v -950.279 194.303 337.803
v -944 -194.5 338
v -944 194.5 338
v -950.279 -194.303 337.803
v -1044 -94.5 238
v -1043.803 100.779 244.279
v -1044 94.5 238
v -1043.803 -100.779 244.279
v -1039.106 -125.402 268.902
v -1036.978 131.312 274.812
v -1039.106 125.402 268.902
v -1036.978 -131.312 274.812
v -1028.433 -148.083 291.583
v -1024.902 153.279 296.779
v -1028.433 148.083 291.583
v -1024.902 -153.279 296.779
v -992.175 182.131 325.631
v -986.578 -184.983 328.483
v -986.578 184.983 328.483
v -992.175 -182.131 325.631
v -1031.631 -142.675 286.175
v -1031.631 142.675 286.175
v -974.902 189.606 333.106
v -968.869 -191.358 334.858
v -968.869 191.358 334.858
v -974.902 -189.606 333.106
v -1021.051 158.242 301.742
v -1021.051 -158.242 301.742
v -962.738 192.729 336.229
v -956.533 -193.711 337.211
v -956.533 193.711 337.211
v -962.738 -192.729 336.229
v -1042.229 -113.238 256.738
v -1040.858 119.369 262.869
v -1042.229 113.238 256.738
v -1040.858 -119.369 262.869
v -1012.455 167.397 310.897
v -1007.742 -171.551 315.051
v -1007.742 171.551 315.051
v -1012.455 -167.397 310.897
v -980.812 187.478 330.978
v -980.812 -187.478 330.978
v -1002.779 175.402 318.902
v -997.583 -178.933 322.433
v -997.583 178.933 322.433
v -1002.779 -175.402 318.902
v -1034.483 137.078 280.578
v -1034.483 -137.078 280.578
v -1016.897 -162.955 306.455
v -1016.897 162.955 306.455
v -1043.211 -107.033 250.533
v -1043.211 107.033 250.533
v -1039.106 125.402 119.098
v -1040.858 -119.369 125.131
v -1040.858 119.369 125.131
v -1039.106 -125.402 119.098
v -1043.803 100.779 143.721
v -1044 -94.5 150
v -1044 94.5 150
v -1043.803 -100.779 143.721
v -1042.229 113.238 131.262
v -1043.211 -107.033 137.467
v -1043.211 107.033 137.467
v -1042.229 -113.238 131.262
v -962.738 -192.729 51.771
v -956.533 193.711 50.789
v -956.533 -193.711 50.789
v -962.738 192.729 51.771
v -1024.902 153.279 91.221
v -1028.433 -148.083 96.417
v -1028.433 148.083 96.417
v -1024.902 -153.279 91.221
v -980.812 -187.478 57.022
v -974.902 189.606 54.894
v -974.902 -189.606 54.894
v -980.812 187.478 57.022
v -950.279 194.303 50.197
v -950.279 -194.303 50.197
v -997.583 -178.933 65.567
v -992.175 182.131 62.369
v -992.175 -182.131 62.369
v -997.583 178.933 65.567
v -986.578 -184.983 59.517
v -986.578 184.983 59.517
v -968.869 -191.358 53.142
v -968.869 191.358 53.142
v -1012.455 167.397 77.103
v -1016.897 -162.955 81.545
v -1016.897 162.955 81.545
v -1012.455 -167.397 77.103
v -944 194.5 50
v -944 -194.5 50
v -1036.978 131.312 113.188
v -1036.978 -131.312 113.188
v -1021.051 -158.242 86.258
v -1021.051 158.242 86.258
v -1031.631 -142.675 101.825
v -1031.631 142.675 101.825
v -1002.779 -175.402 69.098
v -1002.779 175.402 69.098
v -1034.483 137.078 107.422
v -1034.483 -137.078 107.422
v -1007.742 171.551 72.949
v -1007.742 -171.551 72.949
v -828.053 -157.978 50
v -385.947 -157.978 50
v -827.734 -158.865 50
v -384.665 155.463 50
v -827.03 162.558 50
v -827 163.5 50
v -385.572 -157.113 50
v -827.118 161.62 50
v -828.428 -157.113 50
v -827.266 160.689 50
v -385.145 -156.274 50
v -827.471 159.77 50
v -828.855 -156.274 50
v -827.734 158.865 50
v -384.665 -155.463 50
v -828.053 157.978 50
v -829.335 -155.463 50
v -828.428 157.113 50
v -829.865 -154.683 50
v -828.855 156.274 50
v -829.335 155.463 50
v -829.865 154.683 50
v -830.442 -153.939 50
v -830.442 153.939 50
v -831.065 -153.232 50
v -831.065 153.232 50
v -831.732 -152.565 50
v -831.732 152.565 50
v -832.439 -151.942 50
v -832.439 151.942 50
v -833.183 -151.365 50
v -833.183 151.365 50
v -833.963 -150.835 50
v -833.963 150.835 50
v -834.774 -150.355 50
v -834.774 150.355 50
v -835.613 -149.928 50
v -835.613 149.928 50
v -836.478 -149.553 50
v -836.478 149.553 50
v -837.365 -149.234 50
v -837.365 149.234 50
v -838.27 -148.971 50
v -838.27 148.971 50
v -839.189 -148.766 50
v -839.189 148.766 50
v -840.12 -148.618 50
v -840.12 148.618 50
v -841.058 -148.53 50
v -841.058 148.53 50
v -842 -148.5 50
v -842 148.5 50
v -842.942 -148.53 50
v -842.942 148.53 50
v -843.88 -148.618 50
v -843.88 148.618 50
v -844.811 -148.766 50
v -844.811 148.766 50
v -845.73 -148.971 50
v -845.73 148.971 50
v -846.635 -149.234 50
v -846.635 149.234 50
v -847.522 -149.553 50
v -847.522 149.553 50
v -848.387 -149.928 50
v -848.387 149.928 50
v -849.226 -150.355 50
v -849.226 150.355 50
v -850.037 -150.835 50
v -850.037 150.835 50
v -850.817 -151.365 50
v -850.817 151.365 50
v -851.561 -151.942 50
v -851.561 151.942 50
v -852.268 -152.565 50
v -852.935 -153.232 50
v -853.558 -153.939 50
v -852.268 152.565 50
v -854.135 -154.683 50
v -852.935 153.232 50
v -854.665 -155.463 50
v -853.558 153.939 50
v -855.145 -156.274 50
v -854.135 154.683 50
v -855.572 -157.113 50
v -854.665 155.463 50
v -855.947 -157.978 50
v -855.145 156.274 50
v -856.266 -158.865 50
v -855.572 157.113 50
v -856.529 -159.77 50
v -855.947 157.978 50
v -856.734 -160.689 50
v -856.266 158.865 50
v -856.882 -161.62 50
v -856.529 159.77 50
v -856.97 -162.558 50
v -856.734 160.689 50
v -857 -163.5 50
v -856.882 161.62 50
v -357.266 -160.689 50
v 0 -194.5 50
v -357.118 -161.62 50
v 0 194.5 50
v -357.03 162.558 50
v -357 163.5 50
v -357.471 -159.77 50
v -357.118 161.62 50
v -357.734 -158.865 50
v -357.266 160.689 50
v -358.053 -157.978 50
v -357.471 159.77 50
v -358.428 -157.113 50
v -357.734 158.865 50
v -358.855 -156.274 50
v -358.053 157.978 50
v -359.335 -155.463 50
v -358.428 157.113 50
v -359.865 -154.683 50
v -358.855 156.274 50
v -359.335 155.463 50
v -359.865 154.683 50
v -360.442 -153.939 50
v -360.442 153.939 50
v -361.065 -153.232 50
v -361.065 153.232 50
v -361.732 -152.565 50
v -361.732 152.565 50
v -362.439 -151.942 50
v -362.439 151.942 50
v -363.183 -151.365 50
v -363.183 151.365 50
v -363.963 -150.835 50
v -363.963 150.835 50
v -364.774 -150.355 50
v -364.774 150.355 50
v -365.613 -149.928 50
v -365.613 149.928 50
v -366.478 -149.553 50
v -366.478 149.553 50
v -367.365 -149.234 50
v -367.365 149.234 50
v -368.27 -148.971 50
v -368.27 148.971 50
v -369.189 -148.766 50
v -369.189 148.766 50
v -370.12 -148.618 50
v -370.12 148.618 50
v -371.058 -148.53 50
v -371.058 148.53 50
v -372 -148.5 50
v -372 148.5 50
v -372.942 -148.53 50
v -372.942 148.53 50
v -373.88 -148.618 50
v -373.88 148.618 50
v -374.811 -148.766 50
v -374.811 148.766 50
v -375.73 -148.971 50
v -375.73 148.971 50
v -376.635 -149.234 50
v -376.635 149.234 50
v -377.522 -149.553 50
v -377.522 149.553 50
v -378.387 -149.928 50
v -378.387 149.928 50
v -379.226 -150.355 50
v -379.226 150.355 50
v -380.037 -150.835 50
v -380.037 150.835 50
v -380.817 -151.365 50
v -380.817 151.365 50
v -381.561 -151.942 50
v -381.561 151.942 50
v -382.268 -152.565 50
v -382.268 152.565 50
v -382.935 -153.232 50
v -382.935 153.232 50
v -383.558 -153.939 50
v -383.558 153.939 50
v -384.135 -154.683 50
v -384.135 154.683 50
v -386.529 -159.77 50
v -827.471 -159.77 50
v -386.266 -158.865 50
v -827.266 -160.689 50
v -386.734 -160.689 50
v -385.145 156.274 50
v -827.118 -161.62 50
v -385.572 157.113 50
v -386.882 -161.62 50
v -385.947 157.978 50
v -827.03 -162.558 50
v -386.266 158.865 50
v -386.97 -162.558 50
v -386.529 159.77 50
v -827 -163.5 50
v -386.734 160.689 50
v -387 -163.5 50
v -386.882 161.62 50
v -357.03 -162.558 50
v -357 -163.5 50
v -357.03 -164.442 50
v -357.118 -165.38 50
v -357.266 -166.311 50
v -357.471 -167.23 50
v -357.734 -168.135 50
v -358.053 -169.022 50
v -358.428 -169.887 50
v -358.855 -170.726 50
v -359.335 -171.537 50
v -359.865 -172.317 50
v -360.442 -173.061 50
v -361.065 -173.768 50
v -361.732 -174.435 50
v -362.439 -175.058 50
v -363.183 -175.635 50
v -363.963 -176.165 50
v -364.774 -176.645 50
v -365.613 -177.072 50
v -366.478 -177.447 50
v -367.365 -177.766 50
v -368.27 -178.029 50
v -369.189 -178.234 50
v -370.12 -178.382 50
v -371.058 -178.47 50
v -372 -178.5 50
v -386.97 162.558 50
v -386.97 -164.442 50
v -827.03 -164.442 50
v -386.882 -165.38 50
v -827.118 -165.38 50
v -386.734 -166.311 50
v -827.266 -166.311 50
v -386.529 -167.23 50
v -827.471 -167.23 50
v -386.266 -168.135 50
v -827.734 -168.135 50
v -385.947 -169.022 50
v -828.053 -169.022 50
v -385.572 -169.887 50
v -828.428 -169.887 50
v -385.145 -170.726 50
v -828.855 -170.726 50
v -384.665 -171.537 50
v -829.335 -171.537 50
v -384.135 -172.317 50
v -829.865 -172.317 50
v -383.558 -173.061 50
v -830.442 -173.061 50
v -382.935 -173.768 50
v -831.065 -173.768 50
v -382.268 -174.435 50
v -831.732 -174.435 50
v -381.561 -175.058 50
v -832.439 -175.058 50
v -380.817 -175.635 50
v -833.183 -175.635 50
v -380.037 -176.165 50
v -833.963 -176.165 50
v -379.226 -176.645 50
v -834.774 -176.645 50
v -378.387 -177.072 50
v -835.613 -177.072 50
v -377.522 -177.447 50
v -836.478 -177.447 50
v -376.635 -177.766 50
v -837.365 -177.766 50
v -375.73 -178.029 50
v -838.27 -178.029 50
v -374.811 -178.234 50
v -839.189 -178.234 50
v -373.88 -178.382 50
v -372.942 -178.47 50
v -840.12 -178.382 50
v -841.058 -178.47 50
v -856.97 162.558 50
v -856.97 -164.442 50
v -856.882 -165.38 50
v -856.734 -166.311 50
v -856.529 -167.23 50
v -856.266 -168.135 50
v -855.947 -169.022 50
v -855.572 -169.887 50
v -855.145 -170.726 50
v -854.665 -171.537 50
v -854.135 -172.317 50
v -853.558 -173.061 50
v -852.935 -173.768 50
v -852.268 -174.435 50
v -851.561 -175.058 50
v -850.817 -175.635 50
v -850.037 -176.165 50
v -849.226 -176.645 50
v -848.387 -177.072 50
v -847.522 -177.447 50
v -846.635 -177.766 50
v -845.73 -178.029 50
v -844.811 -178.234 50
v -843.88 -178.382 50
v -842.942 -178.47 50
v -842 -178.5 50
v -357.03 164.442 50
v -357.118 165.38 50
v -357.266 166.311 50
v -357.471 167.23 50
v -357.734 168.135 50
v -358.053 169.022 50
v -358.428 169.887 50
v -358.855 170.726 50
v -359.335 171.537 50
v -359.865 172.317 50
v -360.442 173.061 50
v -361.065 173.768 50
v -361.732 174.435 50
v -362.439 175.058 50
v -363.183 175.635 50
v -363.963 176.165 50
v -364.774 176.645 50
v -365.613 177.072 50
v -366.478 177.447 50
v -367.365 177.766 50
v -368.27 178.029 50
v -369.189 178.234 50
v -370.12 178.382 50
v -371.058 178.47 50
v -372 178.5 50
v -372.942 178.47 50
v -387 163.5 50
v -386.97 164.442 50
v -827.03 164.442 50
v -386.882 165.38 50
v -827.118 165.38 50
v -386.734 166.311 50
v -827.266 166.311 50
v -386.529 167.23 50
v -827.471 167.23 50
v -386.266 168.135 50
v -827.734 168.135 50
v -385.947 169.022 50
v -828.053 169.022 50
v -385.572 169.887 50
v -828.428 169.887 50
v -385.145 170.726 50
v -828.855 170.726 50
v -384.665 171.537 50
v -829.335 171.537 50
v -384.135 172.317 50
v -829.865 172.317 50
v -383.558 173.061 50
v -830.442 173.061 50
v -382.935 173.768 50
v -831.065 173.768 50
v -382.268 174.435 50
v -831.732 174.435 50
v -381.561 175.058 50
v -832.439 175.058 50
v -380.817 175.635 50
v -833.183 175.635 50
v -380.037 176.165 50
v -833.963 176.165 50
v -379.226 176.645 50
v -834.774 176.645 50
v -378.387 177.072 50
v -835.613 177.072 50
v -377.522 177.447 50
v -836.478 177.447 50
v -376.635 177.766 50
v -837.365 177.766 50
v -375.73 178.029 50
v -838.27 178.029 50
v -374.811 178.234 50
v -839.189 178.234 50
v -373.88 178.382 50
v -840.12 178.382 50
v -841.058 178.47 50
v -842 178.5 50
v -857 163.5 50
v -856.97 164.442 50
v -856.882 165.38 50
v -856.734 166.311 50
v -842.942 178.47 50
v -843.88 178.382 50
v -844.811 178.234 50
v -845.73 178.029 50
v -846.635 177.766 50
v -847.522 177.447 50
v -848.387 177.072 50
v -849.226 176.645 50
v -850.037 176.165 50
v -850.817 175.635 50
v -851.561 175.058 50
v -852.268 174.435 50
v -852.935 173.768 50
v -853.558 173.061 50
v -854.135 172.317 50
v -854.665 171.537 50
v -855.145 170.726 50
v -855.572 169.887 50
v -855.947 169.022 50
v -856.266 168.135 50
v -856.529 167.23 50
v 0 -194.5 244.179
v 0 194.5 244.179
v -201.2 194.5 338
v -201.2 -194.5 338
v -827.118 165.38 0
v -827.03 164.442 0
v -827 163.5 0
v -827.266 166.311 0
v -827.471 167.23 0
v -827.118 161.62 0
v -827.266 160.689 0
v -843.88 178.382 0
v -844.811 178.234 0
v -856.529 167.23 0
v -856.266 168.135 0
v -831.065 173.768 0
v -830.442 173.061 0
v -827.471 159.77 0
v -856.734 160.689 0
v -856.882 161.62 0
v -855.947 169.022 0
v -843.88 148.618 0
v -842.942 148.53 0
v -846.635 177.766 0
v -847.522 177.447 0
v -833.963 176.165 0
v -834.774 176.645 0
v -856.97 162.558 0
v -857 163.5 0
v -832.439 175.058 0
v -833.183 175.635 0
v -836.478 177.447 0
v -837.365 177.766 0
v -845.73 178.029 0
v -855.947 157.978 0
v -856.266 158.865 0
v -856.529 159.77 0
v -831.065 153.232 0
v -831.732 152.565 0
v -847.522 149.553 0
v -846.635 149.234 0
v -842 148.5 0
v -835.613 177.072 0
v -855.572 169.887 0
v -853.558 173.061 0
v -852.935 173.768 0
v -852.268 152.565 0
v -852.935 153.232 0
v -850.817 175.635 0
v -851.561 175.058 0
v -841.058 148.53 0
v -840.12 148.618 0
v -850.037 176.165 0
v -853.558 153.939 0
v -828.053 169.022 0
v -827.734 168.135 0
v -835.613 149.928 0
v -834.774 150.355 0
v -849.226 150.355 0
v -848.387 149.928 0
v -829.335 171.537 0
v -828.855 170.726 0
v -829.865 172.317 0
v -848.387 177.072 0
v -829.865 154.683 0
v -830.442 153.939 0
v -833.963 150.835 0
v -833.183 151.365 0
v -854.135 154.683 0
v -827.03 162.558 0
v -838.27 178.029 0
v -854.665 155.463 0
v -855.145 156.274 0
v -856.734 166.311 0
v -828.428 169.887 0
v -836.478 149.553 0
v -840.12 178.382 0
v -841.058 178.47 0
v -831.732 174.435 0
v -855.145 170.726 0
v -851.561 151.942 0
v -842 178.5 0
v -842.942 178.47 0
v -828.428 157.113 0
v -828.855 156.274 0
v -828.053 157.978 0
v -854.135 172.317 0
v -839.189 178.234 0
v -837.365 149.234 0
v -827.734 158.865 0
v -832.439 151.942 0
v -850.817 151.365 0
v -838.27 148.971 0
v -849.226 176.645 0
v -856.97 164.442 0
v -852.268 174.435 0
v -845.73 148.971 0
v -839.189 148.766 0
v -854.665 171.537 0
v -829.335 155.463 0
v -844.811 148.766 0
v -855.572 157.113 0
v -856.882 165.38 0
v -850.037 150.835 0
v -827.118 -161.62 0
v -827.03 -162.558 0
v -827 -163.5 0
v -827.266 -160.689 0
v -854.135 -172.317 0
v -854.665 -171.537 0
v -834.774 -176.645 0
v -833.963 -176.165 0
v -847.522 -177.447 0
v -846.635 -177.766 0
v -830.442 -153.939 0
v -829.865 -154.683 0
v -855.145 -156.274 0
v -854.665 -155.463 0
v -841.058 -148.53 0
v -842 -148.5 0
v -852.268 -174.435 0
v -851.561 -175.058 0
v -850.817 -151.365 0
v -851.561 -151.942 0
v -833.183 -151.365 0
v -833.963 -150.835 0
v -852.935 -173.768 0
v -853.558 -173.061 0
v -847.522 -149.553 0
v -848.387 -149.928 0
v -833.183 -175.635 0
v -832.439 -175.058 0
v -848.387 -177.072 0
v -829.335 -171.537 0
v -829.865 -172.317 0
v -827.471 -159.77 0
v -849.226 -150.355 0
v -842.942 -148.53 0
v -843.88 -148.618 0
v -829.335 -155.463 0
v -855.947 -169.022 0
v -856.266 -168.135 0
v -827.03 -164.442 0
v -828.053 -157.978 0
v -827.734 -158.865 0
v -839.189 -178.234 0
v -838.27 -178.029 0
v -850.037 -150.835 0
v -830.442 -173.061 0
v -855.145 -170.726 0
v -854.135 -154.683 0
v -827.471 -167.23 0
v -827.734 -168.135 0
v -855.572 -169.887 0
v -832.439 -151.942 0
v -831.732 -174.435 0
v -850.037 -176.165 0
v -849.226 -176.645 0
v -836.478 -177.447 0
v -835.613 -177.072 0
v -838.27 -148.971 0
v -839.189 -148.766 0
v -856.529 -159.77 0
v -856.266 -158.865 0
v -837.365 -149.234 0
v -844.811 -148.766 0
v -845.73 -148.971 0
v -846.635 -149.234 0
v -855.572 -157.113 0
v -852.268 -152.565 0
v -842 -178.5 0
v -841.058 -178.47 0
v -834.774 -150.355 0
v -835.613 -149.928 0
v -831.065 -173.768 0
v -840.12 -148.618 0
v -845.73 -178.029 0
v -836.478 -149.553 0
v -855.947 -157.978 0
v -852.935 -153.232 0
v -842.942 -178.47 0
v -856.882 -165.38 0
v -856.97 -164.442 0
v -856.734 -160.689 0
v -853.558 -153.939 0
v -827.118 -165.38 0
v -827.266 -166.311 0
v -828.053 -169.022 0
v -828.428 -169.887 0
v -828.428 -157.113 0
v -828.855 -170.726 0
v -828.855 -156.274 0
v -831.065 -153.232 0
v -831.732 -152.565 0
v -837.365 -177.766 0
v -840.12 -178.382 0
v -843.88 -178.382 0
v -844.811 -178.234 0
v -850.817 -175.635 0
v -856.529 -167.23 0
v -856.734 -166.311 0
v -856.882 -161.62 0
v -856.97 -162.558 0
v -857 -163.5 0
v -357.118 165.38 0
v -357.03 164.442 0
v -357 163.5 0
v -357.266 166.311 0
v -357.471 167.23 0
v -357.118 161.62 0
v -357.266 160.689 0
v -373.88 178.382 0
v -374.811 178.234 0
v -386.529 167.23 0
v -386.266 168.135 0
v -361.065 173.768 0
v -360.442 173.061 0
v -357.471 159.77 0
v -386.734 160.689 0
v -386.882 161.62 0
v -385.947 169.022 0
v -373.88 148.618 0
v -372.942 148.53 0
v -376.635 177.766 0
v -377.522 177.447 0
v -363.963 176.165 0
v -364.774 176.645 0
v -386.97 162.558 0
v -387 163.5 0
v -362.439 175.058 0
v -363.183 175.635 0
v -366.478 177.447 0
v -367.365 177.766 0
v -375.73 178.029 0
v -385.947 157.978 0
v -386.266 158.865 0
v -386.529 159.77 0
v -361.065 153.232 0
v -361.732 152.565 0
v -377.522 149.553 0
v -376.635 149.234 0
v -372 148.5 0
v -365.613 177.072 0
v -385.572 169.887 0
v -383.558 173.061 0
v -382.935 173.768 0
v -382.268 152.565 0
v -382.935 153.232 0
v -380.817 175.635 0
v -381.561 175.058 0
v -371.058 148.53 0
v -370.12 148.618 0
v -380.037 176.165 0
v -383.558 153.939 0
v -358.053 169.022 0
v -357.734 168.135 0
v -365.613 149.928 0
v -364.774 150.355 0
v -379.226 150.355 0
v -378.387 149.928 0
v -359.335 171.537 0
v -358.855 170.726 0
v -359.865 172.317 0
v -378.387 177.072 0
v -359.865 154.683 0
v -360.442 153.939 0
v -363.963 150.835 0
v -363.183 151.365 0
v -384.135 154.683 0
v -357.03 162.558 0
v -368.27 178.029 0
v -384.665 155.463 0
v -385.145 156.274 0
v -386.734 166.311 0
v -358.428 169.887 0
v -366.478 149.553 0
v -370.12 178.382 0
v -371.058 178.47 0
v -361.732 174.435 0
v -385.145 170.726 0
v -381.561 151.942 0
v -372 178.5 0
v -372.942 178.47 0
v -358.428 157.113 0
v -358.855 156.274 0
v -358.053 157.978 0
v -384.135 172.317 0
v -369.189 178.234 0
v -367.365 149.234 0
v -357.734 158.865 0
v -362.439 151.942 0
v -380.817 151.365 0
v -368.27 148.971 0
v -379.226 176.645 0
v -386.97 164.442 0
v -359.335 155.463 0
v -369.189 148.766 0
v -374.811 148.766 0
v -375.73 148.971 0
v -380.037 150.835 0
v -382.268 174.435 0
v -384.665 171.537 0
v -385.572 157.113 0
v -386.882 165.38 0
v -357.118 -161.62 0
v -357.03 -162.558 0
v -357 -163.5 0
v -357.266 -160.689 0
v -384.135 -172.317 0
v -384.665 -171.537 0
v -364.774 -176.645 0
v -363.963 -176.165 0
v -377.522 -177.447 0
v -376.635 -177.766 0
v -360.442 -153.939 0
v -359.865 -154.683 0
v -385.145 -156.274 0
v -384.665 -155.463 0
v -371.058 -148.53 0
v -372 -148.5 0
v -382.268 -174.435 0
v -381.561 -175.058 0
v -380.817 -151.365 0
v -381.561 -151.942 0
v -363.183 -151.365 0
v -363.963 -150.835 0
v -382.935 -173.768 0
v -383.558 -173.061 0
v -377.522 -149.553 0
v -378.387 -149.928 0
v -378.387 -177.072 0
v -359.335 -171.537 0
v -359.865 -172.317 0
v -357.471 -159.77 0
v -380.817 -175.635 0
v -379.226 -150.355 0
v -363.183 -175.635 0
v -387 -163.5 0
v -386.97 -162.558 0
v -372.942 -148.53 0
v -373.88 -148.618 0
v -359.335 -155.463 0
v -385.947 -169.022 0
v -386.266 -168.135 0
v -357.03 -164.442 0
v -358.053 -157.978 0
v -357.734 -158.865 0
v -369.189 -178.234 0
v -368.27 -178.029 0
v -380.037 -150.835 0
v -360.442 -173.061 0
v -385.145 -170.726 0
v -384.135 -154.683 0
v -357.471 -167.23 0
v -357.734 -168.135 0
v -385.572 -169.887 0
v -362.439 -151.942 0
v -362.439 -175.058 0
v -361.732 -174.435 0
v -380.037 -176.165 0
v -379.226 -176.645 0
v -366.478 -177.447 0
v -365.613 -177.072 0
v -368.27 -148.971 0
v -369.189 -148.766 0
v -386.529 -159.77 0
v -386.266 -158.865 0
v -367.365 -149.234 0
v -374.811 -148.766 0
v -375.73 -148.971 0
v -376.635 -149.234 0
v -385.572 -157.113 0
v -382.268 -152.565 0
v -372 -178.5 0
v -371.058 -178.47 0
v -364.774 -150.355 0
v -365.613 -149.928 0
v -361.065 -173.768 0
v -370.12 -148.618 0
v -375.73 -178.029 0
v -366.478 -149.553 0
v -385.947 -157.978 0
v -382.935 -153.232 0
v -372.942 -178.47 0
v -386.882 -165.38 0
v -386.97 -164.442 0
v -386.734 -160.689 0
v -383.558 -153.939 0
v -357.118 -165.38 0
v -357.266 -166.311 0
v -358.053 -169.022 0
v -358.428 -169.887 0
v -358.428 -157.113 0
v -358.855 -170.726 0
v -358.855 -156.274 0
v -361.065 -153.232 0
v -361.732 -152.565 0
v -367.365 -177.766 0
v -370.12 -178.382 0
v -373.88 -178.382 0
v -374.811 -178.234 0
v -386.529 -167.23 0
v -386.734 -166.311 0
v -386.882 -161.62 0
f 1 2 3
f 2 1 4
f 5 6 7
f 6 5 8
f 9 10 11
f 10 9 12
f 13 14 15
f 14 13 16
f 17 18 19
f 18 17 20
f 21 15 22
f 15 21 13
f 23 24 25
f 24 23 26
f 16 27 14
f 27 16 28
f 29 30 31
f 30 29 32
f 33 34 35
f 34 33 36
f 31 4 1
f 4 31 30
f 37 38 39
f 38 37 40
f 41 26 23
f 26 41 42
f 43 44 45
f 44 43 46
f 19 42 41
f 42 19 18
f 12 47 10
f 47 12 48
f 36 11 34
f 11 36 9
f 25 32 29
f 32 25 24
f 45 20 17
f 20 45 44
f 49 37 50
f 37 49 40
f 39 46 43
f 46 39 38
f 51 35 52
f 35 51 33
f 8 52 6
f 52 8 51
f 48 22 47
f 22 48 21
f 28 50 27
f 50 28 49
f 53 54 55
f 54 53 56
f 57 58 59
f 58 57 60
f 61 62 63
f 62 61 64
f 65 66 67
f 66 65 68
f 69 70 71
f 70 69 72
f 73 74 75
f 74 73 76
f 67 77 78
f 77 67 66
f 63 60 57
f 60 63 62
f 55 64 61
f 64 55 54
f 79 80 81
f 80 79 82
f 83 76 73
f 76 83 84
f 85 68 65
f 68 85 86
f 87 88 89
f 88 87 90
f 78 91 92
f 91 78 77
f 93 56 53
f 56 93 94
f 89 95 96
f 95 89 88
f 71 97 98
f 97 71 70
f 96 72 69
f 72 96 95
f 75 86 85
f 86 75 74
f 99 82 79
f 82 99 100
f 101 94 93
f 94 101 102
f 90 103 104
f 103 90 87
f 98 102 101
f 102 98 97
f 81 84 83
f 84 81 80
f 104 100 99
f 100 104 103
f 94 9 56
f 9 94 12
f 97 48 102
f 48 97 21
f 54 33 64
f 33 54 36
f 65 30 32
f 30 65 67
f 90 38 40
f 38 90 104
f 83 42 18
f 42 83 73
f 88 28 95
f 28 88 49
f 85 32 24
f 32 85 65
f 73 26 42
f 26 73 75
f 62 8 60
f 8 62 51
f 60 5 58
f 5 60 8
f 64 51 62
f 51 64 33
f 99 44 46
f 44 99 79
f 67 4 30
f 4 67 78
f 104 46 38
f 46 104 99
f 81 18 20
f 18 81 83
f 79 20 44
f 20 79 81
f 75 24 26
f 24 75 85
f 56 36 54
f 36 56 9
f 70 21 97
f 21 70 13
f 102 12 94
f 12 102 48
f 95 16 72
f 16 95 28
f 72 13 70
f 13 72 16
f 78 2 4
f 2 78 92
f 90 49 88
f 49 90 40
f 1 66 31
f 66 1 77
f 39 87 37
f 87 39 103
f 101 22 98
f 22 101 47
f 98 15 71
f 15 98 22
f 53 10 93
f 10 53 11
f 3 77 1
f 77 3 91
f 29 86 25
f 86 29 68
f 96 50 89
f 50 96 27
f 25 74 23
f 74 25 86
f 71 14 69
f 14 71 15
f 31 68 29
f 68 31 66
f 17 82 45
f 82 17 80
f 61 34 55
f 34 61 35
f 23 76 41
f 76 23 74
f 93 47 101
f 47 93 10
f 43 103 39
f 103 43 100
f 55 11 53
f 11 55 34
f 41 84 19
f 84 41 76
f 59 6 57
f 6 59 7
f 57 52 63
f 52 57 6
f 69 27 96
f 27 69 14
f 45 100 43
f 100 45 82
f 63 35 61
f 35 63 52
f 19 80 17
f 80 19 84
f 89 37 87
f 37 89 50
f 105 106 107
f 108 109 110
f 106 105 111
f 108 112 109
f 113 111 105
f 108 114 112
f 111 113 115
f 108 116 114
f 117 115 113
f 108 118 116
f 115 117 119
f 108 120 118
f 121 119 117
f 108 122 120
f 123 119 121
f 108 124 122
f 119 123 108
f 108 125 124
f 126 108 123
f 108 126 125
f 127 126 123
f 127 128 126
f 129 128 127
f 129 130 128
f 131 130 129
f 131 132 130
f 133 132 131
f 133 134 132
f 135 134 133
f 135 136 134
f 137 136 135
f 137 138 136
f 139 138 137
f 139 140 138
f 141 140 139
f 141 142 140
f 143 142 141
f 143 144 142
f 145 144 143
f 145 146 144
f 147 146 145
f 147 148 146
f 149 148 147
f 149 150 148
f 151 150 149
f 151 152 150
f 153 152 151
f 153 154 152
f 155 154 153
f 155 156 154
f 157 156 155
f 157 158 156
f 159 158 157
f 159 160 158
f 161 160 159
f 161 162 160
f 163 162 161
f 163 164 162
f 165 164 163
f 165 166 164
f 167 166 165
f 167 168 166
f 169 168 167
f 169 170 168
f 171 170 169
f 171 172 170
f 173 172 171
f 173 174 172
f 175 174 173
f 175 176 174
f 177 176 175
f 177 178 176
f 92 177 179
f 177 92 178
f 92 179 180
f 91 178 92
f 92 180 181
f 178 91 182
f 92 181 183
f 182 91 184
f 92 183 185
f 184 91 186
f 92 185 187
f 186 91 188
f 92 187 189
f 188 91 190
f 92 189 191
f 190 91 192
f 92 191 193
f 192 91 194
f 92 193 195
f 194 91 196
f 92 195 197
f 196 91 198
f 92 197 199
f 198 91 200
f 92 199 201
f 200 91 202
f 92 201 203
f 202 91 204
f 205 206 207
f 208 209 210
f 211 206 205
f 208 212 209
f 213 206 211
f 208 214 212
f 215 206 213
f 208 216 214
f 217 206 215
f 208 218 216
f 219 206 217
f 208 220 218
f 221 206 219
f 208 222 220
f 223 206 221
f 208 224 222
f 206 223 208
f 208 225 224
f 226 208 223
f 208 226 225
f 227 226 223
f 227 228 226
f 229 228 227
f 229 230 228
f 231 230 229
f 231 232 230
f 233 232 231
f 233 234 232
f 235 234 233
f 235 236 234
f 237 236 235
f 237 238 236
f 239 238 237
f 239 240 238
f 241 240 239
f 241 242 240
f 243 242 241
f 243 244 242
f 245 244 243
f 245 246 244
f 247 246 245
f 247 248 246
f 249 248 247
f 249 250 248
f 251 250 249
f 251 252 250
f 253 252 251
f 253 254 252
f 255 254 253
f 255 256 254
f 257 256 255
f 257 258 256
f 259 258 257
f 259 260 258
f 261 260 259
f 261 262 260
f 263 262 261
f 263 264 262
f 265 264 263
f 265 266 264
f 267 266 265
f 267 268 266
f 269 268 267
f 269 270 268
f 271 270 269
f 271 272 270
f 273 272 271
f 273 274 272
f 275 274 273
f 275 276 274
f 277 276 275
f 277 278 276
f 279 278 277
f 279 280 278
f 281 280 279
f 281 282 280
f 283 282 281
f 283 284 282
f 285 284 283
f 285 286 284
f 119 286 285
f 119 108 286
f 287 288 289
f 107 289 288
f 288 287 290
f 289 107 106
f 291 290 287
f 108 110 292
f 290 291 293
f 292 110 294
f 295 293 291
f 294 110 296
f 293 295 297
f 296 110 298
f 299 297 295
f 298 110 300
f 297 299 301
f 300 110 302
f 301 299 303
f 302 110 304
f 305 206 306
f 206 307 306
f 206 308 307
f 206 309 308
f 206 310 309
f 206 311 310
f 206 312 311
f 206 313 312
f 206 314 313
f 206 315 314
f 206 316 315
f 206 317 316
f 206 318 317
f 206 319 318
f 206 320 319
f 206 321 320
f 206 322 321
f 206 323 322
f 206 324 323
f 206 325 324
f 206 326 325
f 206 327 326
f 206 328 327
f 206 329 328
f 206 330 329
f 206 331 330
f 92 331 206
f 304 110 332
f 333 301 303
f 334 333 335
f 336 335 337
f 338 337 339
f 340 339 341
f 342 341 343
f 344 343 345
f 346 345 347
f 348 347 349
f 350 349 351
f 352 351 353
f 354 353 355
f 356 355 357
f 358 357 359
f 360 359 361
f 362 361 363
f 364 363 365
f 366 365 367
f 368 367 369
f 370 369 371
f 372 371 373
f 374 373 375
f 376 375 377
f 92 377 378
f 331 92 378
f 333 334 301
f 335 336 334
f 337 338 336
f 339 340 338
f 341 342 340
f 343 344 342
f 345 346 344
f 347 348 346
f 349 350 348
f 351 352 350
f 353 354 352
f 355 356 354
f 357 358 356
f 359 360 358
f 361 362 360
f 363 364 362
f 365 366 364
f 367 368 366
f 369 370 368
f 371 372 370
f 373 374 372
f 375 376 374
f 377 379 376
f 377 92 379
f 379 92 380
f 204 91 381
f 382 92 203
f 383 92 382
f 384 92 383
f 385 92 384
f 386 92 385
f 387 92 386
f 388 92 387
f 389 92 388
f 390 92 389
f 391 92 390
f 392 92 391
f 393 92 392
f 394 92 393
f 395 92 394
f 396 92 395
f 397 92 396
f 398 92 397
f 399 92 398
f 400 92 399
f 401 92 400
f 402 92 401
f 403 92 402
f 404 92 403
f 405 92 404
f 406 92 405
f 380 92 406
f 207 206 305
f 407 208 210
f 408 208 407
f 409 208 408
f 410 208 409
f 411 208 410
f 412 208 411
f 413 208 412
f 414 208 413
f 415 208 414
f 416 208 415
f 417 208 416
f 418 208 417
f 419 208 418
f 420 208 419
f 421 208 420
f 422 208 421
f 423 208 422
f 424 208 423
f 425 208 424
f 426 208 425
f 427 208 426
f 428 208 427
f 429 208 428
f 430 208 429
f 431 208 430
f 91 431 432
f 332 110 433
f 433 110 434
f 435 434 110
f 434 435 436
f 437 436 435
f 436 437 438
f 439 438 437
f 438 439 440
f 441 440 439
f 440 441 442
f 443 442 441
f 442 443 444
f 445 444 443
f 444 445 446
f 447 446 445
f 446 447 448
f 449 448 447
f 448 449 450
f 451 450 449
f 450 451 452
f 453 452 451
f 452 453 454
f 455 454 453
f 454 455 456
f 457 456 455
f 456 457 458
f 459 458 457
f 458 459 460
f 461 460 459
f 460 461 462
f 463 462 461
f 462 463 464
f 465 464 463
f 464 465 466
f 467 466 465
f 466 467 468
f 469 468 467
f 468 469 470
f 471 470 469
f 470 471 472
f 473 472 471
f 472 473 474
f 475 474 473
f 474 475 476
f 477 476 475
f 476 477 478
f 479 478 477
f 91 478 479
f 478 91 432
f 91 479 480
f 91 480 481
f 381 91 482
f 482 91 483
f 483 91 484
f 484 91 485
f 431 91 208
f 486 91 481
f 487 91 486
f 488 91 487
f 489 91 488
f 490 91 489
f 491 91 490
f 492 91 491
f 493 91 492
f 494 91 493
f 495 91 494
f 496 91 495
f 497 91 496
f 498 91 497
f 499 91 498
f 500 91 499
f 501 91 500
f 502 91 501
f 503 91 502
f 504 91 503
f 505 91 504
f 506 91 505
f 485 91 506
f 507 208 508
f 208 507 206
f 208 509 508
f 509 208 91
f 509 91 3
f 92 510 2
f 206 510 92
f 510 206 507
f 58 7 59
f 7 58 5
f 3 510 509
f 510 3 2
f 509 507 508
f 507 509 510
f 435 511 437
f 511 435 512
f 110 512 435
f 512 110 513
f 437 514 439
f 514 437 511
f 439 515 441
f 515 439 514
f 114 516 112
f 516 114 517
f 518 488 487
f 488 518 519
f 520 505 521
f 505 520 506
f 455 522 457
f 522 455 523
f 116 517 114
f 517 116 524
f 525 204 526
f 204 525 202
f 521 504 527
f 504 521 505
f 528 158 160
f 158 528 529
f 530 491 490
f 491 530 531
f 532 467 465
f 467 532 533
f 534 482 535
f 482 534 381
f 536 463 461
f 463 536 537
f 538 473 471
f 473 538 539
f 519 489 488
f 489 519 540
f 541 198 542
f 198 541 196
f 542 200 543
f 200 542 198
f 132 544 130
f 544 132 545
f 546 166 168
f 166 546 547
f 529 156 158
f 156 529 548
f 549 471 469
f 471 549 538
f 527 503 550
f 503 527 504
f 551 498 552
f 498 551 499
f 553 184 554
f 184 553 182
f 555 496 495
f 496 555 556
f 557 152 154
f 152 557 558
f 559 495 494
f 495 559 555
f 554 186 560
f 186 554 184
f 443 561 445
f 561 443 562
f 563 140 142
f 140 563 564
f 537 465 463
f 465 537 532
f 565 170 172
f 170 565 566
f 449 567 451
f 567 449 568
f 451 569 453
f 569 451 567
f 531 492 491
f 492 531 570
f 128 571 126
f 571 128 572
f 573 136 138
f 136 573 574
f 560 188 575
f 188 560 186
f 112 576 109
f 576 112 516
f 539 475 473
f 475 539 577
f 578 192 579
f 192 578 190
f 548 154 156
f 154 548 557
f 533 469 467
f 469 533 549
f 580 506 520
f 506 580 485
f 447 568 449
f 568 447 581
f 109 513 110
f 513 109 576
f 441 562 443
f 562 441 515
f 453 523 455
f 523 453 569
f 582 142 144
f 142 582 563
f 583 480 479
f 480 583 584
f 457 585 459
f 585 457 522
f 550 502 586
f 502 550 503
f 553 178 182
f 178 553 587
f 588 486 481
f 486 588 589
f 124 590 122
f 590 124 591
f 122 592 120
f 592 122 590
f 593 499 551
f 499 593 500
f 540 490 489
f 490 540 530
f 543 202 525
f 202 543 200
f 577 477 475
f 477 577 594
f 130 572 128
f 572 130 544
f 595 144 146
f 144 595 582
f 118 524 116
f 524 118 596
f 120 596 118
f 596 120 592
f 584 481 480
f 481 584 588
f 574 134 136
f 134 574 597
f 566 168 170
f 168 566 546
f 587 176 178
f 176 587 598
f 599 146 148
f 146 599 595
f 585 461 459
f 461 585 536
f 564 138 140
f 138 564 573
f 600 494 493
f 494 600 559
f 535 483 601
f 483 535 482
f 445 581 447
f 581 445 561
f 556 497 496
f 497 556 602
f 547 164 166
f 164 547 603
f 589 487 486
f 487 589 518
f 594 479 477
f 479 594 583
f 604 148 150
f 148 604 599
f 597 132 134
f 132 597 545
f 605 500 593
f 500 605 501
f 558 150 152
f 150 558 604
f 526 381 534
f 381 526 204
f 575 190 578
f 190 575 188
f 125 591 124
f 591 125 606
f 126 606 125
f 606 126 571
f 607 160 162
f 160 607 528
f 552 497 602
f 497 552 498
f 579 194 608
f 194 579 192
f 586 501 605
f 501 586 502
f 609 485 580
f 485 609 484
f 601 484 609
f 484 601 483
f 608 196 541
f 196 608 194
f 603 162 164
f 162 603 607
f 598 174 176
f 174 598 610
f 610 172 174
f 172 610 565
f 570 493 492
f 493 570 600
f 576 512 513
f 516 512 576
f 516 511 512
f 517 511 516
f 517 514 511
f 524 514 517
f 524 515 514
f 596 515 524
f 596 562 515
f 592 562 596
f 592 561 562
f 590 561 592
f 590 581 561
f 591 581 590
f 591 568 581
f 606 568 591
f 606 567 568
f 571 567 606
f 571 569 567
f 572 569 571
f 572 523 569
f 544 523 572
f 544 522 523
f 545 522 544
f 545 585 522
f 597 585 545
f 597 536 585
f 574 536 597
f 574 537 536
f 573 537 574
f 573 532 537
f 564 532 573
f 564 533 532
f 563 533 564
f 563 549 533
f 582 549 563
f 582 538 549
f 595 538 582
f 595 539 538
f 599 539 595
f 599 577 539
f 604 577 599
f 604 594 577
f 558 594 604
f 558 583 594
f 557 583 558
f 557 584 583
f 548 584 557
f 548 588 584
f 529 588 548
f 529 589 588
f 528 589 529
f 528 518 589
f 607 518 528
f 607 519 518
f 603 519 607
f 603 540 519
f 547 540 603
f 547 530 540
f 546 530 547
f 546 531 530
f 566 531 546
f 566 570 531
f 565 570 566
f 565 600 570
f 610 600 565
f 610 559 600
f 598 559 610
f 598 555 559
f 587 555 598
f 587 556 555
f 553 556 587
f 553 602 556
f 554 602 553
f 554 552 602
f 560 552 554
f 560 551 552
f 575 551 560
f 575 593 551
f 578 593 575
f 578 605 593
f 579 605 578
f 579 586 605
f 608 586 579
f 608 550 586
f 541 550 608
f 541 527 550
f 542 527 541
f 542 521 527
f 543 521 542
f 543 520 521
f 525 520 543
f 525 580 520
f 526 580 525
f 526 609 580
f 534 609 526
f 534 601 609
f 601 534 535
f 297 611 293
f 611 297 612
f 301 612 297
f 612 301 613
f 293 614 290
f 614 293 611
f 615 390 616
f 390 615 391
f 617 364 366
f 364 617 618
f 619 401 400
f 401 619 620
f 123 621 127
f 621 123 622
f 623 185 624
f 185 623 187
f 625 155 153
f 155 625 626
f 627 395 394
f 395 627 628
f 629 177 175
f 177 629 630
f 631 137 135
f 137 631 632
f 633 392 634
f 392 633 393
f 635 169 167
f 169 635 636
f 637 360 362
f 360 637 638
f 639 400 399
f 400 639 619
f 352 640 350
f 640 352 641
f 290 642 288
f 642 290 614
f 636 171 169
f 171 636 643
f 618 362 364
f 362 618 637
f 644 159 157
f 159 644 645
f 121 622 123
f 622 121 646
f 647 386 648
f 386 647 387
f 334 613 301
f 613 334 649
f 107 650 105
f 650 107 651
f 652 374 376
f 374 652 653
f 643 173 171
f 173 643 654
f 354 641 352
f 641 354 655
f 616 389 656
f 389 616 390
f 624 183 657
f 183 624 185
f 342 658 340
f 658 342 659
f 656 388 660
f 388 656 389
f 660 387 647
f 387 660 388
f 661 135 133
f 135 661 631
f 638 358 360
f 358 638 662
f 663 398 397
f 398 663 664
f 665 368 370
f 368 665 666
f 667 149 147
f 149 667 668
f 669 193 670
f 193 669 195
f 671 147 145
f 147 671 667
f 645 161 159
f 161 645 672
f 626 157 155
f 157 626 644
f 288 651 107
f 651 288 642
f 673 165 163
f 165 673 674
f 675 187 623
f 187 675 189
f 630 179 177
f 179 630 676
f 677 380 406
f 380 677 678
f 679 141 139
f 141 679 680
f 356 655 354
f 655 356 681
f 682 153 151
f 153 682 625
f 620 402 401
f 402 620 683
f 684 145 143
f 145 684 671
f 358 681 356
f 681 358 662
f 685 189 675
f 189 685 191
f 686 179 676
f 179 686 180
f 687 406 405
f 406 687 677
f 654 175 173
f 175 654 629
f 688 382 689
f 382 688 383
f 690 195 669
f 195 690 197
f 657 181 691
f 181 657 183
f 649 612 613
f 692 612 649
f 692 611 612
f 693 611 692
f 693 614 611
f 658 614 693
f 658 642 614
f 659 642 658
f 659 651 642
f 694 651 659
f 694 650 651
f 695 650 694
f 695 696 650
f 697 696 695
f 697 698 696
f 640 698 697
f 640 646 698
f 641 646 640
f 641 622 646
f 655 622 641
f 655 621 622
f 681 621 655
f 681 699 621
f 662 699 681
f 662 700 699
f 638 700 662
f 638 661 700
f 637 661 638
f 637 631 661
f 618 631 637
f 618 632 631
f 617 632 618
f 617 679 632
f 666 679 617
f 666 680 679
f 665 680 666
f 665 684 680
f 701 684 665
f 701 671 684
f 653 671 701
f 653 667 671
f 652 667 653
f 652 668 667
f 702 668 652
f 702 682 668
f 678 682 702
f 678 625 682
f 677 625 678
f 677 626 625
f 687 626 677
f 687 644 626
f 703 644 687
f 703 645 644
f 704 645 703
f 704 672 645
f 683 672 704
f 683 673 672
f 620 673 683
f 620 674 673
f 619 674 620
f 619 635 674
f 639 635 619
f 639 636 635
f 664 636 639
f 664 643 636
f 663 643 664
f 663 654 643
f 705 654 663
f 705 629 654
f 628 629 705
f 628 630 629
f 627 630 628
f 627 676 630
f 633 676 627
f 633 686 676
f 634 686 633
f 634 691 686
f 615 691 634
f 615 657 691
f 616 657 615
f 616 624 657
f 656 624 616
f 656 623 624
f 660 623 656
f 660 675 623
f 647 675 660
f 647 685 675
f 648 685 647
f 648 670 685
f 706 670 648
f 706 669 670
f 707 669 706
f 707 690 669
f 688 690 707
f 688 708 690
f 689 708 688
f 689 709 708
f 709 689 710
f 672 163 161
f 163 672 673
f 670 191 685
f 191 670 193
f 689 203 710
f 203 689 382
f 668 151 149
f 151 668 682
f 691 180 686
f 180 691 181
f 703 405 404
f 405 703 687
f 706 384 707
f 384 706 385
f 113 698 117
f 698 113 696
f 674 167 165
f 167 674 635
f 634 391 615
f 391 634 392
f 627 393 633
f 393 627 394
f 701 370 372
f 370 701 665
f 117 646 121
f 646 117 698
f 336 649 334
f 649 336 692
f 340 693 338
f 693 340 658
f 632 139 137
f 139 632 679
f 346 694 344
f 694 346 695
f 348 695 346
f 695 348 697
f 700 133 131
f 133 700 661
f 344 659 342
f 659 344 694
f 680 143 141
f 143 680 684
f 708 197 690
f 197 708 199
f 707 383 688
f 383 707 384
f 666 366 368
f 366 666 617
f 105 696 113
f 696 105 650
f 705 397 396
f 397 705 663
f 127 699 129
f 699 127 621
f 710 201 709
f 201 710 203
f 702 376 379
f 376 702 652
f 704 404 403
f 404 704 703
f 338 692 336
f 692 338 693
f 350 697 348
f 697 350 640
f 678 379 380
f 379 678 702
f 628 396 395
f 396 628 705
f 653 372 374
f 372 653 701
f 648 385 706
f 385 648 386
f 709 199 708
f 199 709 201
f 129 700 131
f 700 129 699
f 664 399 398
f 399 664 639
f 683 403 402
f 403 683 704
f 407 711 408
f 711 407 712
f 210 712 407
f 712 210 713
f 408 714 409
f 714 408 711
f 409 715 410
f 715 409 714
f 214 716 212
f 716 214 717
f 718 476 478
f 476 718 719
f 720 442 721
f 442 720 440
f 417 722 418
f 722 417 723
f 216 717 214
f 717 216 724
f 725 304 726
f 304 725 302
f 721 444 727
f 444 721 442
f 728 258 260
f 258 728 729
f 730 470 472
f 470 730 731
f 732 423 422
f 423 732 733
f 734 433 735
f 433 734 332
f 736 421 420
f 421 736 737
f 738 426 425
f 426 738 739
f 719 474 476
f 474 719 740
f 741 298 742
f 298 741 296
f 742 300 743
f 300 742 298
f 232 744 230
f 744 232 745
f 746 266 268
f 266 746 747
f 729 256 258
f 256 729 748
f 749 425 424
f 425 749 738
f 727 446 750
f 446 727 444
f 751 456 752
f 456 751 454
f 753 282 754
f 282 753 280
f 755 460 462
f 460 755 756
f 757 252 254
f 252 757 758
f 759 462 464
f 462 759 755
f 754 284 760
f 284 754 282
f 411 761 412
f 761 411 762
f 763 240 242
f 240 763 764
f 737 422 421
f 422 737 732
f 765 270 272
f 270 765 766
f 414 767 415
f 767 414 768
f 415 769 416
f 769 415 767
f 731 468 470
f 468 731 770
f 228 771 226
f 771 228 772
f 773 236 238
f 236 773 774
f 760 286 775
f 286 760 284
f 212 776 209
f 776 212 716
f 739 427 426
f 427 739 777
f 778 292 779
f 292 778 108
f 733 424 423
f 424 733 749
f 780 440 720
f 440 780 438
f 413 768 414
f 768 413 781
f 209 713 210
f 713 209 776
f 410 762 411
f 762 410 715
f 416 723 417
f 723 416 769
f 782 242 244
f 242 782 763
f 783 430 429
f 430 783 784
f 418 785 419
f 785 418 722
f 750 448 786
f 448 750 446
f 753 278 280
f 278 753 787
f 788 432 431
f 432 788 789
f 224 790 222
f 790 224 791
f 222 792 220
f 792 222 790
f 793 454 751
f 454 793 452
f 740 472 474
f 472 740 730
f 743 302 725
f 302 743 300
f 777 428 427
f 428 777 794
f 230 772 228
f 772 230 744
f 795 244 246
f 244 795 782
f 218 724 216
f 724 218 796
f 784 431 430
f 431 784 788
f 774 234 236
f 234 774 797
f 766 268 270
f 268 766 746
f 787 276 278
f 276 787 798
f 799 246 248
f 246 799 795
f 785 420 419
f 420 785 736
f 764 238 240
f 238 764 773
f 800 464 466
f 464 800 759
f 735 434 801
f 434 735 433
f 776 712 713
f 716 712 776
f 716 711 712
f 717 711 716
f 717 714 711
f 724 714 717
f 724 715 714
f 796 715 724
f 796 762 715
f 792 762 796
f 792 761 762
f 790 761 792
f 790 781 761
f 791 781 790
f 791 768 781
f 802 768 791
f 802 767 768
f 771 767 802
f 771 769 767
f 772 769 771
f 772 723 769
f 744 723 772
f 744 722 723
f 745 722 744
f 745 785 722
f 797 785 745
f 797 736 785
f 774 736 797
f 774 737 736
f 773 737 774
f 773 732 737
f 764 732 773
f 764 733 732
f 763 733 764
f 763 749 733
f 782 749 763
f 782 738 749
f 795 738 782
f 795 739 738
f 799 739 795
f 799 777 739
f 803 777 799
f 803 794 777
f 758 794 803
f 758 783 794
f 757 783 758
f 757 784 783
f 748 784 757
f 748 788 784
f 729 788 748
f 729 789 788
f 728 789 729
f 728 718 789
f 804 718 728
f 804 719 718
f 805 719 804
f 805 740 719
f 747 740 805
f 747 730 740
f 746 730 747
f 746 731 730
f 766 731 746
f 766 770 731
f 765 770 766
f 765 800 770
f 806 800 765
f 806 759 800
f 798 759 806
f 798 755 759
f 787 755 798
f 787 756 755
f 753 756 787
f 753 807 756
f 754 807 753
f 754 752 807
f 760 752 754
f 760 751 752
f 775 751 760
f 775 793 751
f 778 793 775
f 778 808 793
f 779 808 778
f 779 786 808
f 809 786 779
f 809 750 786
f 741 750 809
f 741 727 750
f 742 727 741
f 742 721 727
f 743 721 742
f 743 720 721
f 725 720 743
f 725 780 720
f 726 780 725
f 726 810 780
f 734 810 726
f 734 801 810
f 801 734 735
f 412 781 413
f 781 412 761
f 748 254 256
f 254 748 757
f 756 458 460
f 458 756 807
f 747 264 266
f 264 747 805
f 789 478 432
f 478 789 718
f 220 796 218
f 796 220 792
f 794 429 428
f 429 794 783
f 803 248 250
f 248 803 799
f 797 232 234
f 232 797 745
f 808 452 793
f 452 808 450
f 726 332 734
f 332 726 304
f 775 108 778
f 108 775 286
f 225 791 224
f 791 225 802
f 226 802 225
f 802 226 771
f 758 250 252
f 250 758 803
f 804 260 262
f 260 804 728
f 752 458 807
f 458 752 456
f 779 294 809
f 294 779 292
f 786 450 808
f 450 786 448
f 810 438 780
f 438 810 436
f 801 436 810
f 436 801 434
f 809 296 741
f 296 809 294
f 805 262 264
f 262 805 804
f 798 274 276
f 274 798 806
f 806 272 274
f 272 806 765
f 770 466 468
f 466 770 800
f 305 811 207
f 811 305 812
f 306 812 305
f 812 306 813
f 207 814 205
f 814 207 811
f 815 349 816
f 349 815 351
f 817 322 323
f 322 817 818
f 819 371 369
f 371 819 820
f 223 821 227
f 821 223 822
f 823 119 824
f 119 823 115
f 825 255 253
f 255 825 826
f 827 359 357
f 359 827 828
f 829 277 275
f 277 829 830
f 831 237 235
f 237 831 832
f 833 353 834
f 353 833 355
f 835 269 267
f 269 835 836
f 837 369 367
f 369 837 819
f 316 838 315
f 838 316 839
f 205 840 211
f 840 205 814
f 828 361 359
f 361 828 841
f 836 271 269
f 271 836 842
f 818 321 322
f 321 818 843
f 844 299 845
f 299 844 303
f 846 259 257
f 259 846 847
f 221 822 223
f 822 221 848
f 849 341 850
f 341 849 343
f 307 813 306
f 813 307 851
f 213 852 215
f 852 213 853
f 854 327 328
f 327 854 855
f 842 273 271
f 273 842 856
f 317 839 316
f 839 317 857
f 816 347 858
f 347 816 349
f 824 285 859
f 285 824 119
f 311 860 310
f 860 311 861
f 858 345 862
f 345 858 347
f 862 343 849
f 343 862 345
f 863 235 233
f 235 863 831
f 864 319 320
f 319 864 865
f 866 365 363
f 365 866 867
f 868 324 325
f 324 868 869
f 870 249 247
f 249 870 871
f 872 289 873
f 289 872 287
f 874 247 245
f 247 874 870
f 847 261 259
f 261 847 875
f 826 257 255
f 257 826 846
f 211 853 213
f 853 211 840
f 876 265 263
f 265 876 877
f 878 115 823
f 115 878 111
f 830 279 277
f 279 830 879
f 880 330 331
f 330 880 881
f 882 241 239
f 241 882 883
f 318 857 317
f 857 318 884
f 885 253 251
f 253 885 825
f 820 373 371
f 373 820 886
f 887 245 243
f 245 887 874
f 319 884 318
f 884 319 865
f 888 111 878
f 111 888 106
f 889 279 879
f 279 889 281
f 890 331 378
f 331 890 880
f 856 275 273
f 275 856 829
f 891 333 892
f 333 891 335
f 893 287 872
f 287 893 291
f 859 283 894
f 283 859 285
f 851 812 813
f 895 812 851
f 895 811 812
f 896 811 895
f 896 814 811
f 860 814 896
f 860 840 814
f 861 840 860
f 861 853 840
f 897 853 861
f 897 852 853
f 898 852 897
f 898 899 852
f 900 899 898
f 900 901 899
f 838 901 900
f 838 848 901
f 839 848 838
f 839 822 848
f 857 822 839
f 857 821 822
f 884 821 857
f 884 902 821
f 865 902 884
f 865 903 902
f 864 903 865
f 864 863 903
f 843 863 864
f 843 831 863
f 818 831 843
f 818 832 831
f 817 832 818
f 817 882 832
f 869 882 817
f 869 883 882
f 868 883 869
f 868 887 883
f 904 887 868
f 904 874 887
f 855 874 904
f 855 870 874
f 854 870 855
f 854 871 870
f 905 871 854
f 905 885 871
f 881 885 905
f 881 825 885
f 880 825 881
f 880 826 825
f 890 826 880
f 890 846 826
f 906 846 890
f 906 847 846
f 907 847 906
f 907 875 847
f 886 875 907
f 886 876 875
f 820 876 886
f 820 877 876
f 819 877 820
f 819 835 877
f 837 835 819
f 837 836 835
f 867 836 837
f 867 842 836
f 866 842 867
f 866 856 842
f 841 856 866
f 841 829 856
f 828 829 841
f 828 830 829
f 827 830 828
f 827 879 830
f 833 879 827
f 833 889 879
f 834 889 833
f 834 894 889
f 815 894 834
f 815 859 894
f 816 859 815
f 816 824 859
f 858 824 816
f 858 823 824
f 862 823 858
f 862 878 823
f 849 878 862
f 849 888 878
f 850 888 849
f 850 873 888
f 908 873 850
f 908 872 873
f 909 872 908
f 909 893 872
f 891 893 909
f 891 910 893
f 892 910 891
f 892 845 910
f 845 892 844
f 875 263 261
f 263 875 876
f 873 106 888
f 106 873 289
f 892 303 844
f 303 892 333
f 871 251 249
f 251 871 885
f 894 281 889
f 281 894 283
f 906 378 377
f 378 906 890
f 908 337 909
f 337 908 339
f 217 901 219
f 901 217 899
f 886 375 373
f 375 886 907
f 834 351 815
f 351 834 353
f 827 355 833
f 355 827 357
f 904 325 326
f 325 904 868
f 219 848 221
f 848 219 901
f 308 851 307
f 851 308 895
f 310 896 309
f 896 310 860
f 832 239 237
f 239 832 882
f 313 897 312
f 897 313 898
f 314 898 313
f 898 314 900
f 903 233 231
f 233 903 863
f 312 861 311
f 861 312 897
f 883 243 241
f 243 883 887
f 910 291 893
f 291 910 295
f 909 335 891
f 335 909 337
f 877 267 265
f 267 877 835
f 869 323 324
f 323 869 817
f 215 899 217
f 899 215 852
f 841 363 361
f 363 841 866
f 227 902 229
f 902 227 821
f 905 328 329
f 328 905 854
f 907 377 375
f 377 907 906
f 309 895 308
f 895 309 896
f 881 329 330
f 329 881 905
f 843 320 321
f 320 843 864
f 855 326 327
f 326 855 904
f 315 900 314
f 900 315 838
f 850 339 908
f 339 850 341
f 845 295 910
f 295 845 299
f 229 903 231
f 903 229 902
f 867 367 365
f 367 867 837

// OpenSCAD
angle=25;

$fn=100;
union() {
difference(){
//translate([250,0,0]) rotate([0,0,0]) cube(700,center=true);
translate([0,389/2,0]) rotate([90,0,0]) linear_extrude(height=389) polygon(points=[[-1044,50],[0,50],[0,338-222*sin(angle)],[-222*cos(angle),338],[-1044,338]]);

//z-plus
difference() {
translate([-1394,0,688]) rotate([0,0,0]) cube(900,center=true);
translate([-944,0,238]) rotate([90,0,0]) cylinder(h = 1000, r = 100, center = true);

}
//z-minus
difference() {
translate([-1394,0,-300]) rotate([0,0,0]) cube(900,center=true);
translate([-944,0,150]) rotate([90,0,0]) cylinder(h = 1000, r = 100, center = true);
}

//y-minus
difference() {
translate([-1394,-544.5,0]) rotate([0,0,0]) cube(900,center=true);
translate([-944,-94.5,0]) rotate([0,0,0]) cylinder(h = 1000, r = 100, center = true);
}

//y-plus
difference() {
translate([-1394,544.5,0]) rotate([0,0,0]) cube(900,center=true);
translate([-944,94.5,0]) rotate([0,0,0]) cylinder(h = 1000, r = 100, center = true);
}

}

translate([-842,163.5,30]) cylinder(h=60,r=15,center=true);
translate([-842,-163.5,30]) cylinder(h=60,r=15,center=true);
translate([-372,163.5,30]) cylinder(h=60,r=15,center=true);
translate([-372,-163.5,30]) cylinder(h=60,r=15,center=true);
}
